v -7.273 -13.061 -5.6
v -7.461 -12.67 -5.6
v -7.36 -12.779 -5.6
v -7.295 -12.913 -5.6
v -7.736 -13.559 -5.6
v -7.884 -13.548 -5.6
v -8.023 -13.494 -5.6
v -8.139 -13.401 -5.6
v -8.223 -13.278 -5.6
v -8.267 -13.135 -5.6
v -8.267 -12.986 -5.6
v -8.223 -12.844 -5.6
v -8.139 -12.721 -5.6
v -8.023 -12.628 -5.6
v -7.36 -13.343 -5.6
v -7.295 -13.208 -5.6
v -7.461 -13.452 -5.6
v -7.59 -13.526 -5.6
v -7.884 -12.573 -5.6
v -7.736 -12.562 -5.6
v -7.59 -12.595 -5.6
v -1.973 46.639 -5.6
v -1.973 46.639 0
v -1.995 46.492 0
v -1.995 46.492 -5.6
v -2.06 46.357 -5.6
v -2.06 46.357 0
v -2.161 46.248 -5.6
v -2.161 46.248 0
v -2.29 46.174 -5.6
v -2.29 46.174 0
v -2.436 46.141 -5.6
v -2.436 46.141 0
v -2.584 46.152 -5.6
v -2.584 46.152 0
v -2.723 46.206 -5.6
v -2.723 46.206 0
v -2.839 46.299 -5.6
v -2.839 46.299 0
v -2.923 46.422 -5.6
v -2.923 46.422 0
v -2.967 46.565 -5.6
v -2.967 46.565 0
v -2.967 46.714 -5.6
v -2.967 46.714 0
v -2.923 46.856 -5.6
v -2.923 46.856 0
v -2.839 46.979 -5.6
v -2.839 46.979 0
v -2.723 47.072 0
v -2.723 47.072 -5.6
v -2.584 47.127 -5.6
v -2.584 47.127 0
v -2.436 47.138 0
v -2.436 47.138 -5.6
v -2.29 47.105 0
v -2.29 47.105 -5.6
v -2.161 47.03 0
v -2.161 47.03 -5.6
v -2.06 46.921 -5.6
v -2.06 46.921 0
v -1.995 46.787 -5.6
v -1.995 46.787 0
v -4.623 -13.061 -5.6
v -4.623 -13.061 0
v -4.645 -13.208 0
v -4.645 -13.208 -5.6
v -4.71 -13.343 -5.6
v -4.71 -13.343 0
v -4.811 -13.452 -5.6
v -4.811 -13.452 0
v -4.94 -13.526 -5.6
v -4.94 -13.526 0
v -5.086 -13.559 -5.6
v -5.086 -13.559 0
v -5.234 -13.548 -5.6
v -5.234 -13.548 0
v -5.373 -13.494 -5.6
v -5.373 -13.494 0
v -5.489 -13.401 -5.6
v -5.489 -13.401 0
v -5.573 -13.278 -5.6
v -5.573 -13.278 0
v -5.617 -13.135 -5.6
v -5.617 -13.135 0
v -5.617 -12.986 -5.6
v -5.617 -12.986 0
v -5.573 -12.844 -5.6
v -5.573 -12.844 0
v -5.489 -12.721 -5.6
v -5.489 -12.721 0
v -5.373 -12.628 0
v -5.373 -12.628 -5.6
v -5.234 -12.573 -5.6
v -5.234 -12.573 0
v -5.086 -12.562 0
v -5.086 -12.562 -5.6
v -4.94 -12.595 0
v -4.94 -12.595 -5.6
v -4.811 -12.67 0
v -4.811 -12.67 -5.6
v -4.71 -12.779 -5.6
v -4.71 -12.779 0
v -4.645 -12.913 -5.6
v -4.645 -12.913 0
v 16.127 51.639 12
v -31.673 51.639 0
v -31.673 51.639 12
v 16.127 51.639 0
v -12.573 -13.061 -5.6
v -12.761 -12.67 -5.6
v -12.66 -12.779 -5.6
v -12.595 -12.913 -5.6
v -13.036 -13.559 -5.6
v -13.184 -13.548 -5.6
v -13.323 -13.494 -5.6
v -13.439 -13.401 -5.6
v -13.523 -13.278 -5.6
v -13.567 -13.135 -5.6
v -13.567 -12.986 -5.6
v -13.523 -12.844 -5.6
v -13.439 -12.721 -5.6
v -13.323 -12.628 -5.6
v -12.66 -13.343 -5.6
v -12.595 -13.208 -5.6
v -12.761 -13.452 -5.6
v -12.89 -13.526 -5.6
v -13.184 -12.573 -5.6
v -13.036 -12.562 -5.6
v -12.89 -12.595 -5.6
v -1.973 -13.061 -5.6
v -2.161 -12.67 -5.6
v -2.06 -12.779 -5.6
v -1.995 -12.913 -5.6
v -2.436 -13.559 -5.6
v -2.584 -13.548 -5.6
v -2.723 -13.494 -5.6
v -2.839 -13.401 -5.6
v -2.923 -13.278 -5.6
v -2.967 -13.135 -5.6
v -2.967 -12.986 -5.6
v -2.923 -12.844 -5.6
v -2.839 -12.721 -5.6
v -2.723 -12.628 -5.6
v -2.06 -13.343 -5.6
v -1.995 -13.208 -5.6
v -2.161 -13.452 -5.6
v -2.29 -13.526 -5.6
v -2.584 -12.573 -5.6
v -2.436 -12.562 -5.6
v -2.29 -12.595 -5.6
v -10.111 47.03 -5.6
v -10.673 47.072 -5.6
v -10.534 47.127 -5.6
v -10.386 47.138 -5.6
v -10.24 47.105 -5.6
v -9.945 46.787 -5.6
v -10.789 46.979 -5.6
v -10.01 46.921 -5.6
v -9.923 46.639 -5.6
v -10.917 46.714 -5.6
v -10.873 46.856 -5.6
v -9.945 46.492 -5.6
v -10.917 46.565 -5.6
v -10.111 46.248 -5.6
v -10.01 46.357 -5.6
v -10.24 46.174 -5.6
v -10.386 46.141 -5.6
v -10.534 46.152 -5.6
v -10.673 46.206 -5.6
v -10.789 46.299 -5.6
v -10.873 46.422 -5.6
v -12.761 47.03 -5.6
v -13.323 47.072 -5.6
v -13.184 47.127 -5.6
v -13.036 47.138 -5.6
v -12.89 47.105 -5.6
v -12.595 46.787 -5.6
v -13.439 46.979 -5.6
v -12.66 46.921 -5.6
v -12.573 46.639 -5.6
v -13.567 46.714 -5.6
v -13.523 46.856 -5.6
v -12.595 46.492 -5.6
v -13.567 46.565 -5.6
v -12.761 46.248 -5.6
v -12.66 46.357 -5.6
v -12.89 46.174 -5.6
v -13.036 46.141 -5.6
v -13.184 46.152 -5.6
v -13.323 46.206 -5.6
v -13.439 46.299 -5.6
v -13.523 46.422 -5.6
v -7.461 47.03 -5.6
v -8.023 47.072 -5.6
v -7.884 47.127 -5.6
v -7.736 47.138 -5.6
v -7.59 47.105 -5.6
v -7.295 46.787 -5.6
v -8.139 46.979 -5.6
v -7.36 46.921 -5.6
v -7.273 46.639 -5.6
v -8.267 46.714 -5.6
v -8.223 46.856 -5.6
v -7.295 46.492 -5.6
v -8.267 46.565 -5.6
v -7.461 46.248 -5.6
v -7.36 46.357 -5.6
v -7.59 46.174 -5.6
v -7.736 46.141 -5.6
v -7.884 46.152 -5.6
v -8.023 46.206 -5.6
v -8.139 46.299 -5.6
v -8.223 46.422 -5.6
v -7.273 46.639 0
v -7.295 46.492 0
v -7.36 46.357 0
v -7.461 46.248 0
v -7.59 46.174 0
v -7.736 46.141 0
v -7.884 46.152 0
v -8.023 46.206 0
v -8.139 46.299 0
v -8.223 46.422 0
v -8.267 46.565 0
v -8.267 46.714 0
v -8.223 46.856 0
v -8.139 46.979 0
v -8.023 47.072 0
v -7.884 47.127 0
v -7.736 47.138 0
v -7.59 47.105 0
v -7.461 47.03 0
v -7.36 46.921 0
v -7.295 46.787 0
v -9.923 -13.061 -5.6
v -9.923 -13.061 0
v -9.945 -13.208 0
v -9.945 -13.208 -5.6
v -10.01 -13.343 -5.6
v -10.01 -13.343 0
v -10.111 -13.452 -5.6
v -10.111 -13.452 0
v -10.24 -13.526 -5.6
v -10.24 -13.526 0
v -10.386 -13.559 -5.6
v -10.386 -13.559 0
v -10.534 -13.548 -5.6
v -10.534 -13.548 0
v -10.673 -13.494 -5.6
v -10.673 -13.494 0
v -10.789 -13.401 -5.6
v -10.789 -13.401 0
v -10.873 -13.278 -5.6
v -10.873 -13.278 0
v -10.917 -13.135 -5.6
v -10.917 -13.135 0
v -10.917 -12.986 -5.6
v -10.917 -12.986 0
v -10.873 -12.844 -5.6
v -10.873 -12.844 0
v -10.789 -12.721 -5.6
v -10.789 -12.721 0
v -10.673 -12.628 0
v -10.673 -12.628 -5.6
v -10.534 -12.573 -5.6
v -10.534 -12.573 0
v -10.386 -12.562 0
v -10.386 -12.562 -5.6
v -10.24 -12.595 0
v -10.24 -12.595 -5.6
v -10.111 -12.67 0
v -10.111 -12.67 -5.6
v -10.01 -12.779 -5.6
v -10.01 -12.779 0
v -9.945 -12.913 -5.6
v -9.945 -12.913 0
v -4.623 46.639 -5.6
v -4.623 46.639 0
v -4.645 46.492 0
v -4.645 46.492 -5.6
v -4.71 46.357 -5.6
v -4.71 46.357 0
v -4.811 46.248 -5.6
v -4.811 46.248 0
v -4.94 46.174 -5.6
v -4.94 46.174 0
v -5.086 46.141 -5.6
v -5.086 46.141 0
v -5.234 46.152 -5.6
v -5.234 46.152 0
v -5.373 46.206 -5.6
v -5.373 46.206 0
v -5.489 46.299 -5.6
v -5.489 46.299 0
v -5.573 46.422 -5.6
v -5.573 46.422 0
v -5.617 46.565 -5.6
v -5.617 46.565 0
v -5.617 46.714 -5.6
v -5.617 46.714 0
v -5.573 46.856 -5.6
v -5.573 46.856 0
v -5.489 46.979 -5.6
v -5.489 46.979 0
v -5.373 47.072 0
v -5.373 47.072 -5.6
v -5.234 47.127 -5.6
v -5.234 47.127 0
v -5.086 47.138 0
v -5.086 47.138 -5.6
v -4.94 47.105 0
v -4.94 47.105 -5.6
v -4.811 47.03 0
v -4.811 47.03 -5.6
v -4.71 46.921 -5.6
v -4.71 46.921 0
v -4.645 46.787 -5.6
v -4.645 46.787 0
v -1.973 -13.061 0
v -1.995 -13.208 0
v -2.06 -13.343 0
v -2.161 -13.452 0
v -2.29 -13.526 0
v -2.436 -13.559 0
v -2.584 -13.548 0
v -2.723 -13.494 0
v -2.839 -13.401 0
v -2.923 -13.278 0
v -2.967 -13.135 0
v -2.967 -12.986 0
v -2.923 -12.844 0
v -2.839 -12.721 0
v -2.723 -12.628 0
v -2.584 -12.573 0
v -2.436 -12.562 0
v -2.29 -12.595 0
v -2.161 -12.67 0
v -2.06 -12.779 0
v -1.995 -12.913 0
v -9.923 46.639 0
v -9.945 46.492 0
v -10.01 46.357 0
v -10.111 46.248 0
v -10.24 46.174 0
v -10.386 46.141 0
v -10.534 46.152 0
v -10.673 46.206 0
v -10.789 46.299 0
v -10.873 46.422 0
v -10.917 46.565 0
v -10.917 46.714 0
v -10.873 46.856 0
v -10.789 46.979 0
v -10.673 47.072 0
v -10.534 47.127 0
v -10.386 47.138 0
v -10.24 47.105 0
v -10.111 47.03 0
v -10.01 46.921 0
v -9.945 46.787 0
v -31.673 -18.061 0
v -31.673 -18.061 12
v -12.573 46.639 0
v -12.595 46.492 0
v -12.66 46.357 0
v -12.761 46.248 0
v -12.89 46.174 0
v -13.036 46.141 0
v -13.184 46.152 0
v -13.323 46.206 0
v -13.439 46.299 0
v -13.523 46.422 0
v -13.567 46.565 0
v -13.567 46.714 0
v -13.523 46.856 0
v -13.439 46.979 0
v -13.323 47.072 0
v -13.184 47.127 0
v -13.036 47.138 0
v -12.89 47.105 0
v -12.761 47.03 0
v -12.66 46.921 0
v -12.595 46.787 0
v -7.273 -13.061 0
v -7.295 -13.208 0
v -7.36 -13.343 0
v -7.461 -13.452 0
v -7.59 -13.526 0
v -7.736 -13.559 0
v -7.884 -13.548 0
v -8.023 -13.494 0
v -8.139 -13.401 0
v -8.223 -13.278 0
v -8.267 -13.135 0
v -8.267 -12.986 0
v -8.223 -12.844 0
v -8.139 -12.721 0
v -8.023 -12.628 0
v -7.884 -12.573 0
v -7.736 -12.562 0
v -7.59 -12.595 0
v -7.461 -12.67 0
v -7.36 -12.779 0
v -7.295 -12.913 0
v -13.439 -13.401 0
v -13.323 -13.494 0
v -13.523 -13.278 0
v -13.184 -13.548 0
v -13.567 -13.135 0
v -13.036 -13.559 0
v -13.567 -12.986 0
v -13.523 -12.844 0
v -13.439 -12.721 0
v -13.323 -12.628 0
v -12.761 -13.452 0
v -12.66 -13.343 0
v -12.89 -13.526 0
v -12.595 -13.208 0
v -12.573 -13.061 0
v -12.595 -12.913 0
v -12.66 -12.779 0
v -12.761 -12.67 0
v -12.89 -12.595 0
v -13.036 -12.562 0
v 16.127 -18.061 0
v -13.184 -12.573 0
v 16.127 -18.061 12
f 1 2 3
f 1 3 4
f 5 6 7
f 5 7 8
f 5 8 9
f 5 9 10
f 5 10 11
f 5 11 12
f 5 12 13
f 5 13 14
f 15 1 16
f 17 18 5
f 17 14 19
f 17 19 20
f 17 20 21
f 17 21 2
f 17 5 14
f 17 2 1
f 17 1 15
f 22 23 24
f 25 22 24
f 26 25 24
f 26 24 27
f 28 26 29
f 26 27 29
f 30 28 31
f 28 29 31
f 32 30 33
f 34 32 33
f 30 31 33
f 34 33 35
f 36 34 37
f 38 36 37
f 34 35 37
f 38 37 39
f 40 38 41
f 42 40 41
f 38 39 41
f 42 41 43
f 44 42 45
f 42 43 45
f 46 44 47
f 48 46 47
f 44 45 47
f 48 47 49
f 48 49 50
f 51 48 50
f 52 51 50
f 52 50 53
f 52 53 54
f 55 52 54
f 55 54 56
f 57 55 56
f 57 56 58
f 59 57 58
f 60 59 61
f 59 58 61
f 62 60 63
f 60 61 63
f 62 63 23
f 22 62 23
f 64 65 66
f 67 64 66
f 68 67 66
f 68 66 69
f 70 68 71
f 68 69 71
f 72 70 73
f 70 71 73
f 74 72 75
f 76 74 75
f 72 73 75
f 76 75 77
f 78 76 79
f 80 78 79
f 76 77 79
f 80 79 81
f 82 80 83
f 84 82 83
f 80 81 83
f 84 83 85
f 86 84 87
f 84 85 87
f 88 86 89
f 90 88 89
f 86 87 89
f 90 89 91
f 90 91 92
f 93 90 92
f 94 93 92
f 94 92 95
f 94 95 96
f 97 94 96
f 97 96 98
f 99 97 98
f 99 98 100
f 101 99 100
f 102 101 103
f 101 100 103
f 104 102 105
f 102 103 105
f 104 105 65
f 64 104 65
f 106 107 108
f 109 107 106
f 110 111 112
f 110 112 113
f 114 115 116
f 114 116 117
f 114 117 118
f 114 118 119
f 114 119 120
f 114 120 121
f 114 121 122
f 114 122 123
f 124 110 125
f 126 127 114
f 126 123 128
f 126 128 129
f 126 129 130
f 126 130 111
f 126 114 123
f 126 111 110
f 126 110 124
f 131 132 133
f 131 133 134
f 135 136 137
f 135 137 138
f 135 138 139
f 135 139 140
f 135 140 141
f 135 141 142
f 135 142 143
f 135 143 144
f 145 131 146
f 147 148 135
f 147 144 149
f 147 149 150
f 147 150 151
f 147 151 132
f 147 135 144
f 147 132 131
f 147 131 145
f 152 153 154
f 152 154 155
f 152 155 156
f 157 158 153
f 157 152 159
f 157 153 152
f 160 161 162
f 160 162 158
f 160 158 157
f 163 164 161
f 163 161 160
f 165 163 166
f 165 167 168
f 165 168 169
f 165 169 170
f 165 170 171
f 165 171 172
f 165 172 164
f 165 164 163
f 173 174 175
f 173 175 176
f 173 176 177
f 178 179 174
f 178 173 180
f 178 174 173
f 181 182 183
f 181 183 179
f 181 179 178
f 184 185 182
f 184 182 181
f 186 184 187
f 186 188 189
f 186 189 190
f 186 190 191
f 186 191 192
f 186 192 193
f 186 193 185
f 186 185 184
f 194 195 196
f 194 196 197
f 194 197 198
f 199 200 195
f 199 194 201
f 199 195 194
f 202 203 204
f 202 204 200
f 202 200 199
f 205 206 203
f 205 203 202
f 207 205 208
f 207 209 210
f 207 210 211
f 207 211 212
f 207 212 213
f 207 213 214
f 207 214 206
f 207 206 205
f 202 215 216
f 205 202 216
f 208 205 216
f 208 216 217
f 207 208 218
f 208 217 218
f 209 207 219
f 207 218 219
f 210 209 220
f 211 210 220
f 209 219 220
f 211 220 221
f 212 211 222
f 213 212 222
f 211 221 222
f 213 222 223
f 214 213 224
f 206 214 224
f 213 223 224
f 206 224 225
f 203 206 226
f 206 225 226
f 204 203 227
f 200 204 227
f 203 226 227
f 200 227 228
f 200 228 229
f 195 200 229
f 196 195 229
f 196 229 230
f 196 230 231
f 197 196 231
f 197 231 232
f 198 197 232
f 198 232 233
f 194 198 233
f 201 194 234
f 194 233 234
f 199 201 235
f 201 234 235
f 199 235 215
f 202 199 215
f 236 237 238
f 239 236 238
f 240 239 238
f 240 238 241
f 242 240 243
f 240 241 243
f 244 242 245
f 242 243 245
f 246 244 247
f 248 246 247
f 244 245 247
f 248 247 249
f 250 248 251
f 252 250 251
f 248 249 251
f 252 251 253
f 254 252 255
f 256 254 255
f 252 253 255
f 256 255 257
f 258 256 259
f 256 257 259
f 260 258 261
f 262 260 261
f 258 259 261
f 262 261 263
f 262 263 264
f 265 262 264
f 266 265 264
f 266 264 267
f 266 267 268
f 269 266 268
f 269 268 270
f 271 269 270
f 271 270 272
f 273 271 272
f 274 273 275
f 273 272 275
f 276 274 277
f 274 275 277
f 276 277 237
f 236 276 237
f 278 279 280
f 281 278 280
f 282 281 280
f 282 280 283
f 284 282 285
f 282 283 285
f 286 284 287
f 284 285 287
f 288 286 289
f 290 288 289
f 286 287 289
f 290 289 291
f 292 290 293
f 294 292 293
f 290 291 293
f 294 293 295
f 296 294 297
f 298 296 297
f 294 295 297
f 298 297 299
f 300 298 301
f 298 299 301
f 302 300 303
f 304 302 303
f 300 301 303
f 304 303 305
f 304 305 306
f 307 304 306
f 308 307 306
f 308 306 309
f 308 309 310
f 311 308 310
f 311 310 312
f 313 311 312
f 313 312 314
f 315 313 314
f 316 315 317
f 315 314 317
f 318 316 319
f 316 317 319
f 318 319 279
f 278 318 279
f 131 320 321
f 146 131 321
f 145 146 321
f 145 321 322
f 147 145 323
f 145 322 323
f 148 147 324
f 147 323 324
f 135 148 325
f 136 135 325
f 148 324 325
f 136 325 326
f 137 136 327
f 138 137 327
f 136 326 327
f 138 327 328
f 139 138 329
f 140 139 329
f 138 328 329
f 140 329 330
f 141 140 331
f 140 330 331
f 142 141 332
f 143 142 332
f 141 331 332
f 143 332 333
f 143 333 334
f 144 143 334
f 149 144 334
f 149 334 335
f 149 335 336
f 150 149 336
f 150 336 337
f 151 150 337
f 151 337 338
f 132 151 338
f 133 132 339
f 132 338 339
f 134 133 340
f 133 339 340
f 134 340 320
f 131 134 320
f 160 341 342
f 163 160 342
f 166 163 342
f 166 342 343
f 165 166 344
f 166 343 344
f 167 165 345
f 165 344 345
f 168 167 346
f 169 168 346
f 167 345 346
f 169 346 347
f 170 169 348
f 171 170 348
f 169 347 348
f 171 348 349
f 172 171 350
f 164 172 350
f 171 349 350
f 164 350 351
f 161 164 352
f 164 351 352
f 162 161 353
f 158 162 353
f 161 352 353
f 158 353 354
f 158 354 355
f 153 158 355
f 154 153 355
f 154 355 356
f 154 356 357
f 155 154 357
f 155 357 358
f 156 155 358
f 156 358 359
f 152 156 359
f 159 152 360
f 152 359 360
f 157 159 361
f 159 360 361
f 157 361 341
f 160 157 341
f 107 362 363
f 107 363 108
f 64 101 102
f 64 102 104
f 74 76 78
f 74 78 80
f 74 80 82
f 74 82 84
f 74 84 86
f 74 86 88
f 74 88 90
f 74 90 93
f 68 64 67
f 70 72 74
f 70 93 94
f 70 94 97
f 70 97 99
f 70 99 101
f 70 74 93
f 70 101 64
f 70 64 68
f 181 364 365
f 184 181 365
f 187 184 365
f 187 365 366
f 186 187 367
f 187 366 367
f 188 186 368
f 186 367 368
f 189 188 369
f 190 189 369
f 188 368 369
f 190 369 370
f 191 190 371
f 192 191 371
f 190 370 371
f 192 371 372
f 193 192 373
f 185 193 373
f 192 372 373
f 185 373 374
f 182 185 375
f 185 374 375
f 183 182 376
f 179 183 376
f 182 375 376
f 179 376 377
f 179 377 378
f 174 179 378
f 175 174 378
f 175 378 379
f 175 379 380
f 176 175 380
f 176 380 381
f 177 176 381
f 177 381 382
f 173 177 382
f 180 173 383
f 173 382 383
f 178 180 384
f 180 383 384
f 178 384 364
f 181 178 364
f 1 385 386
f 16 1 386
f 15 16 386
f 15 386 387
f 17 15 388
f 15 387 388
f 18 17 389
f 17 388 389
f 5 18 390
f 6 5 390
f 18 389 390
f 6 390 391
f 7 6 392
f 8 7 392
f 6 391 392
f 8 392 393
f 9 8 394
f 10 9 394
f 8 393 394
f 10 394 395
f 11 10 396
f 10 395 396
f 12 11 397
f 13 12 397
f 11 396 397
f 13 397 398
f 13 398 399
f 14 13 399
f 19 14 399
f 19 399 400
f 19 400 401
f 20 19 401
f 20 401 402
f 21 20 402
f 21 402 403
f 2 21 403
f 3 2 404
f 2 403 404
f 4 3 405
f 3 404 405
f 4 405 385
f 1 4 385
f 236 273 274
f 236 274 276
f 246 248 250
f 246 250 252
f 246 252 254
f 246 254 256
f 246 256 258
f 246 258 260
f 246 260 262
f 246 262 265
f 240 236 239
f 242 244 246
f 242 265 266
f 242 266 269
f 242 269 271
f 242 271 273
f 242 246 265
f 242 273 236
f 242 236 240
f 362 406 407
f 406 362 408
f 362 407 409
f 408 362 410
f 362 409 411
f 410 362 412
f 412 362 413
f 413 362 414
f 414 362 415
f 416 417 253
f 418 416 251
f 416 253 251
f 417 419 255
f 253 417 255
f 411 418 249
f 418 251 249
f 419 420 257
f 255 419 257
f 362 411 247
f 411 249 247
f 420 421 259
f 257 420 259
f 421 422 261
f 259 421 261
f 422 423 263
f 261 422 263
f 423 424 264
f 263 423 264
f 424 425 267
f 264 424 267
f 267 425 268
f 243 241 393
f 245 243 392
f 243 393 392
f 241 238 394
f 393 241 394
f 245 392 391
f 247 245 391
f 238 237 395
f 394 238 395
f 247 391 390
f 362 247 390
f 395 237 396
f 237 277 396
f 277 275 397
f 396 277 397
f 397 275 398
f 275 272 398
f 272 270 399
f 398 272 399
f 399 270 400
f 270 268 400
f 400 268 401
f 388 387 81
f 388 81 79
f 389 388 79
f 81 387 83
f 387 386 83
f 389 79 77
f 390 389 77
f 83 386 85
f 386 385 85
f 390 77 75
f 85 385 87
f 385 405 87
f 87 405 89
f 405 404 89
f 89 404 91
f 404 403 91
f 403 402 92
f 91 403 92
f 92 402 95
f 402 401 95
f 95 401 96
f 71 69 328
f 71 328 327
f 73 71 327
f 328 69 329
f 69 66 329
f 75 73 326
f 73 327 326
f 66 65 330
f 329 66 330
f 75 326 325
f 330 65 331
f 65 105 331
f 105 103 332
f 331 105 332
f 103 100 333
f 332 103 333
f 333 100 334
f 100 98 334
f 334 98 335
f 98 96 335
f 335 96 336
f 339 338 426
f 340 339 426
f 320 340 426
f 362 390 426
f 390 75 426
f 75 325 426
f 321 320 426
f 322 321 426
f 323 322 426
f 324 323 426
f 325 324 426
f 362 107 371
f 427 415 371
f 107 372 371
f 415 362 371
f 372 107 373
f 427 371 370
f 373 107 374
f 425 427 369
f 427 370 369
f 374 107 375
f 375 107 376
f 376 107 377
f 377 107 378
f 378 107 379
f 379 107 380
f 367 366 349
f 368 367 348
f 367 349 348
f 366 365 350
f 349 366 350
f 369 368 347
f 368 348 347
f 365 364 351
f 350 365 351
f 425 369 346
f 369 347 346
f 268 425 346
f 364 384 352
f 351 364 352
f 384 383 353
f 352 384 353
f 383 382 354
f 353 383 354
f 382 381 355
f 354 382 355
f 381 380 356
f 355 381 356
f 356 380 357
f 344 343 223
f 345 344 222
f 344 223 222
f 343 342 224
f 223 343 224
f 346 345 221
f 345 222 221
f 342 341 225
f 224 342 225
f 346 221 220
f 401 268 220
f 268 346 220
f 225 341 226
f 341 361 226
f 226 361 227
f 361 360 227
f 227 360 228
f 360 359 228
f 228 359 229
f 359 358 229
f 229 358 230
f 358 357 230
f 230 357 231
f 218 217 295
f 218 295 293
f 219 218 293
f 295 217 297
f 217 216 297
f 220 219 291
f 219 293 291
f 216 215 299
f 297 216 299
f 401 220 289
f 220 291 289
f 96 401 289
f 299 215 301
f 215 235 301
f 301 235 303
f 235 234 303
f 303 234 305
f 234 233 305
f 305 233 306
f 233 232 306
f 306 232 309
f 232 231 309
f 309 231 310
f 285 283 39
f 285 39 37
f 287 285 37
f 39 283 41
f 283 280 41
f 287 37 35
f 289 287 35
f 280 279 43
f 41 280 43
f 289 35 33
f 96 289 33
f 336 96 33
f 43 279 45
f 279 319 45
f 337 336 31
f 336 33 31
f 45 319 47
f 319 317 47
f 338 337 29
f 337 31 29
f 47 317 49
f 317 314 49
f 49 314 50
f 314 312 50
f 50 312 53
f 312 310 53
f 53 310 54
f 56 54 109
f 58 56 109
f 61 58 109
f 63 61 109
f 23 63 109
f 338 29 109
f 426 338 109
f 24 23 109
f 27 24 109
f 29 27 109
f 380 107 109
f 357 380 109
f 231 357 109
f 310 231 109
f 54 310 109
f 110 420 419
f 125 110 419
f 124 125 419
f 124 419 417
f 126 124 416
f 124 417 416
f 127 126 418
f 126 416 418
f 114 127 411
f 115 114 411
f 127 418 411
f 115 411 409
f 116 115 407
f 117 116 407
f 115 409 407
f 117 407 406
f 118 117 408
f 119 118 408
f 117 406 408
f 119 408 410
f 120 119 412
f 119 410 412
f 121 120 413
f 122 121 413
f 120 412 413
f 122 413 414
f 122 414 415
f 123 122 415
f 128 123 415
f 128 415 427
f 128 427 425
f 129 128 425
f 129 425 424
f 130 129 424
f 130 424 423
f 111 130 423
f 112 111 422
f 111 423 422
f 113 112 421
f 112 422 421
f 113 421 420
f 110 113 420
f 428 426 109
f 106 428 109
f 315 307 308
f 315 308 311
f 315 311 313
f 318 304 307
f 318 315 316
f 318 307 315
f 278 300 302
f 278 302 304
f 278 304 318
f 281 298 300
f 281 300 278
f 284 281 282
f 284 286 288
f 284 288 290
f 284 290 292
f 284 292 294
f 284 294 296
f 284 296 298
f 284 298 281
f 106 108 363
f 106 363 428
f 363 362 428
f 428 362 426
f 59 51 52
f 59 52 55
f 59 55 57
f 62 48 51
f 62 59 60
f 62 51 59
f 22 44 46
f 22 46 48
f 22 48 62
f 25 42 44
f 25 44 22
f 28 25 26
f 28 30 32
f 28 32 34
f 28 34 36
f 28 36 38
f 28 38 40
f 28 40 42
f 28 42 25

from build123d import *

# Parameters (mm, degrees)
SKETCH_W            = 47.8
SKETCH_H            = 69.7
PAD_DEPTH           = 12
SKETCH001_R         = 0.5
PAD001_DEPTH        = 5.6
LINEARPATTERN_COUNT = 5
LINEARPATTERN_PITCH = 2.65


with BuildPart() as part:
    # Sketch → Pad (new body)
    with BuildSketch(Plane.XY):
        with Locations((-7.772954, 16.789133)):
            Rectangle(SKETCH_W, SKETCH_H)
    extrude(amount=PAD_DEPTH)

    # Sketch001 → Pad001 (new body)
    with BuildSketch(Plane(origin=(0, 0, 0), x_dir=(1, 0, 0), z_dir=(0, 0, -1))):
        with Locations((-13.072954, 13.060867)):
            Circle(SKETCH001_R)
        with Locations((-13.072954, -46.639133)):
            Circle(SKETCH001_R)
    pad001 = extrude(amount=PAD001_DEPTH)

    # LinearPattern: Pad001 ×5
    with Locations(*[(i * LINEARPATTERN_PITCH, 0, 0) for i in range(1, LINEARPATTERN_COUNT)]):
        add(pad001)


solid = part.part
